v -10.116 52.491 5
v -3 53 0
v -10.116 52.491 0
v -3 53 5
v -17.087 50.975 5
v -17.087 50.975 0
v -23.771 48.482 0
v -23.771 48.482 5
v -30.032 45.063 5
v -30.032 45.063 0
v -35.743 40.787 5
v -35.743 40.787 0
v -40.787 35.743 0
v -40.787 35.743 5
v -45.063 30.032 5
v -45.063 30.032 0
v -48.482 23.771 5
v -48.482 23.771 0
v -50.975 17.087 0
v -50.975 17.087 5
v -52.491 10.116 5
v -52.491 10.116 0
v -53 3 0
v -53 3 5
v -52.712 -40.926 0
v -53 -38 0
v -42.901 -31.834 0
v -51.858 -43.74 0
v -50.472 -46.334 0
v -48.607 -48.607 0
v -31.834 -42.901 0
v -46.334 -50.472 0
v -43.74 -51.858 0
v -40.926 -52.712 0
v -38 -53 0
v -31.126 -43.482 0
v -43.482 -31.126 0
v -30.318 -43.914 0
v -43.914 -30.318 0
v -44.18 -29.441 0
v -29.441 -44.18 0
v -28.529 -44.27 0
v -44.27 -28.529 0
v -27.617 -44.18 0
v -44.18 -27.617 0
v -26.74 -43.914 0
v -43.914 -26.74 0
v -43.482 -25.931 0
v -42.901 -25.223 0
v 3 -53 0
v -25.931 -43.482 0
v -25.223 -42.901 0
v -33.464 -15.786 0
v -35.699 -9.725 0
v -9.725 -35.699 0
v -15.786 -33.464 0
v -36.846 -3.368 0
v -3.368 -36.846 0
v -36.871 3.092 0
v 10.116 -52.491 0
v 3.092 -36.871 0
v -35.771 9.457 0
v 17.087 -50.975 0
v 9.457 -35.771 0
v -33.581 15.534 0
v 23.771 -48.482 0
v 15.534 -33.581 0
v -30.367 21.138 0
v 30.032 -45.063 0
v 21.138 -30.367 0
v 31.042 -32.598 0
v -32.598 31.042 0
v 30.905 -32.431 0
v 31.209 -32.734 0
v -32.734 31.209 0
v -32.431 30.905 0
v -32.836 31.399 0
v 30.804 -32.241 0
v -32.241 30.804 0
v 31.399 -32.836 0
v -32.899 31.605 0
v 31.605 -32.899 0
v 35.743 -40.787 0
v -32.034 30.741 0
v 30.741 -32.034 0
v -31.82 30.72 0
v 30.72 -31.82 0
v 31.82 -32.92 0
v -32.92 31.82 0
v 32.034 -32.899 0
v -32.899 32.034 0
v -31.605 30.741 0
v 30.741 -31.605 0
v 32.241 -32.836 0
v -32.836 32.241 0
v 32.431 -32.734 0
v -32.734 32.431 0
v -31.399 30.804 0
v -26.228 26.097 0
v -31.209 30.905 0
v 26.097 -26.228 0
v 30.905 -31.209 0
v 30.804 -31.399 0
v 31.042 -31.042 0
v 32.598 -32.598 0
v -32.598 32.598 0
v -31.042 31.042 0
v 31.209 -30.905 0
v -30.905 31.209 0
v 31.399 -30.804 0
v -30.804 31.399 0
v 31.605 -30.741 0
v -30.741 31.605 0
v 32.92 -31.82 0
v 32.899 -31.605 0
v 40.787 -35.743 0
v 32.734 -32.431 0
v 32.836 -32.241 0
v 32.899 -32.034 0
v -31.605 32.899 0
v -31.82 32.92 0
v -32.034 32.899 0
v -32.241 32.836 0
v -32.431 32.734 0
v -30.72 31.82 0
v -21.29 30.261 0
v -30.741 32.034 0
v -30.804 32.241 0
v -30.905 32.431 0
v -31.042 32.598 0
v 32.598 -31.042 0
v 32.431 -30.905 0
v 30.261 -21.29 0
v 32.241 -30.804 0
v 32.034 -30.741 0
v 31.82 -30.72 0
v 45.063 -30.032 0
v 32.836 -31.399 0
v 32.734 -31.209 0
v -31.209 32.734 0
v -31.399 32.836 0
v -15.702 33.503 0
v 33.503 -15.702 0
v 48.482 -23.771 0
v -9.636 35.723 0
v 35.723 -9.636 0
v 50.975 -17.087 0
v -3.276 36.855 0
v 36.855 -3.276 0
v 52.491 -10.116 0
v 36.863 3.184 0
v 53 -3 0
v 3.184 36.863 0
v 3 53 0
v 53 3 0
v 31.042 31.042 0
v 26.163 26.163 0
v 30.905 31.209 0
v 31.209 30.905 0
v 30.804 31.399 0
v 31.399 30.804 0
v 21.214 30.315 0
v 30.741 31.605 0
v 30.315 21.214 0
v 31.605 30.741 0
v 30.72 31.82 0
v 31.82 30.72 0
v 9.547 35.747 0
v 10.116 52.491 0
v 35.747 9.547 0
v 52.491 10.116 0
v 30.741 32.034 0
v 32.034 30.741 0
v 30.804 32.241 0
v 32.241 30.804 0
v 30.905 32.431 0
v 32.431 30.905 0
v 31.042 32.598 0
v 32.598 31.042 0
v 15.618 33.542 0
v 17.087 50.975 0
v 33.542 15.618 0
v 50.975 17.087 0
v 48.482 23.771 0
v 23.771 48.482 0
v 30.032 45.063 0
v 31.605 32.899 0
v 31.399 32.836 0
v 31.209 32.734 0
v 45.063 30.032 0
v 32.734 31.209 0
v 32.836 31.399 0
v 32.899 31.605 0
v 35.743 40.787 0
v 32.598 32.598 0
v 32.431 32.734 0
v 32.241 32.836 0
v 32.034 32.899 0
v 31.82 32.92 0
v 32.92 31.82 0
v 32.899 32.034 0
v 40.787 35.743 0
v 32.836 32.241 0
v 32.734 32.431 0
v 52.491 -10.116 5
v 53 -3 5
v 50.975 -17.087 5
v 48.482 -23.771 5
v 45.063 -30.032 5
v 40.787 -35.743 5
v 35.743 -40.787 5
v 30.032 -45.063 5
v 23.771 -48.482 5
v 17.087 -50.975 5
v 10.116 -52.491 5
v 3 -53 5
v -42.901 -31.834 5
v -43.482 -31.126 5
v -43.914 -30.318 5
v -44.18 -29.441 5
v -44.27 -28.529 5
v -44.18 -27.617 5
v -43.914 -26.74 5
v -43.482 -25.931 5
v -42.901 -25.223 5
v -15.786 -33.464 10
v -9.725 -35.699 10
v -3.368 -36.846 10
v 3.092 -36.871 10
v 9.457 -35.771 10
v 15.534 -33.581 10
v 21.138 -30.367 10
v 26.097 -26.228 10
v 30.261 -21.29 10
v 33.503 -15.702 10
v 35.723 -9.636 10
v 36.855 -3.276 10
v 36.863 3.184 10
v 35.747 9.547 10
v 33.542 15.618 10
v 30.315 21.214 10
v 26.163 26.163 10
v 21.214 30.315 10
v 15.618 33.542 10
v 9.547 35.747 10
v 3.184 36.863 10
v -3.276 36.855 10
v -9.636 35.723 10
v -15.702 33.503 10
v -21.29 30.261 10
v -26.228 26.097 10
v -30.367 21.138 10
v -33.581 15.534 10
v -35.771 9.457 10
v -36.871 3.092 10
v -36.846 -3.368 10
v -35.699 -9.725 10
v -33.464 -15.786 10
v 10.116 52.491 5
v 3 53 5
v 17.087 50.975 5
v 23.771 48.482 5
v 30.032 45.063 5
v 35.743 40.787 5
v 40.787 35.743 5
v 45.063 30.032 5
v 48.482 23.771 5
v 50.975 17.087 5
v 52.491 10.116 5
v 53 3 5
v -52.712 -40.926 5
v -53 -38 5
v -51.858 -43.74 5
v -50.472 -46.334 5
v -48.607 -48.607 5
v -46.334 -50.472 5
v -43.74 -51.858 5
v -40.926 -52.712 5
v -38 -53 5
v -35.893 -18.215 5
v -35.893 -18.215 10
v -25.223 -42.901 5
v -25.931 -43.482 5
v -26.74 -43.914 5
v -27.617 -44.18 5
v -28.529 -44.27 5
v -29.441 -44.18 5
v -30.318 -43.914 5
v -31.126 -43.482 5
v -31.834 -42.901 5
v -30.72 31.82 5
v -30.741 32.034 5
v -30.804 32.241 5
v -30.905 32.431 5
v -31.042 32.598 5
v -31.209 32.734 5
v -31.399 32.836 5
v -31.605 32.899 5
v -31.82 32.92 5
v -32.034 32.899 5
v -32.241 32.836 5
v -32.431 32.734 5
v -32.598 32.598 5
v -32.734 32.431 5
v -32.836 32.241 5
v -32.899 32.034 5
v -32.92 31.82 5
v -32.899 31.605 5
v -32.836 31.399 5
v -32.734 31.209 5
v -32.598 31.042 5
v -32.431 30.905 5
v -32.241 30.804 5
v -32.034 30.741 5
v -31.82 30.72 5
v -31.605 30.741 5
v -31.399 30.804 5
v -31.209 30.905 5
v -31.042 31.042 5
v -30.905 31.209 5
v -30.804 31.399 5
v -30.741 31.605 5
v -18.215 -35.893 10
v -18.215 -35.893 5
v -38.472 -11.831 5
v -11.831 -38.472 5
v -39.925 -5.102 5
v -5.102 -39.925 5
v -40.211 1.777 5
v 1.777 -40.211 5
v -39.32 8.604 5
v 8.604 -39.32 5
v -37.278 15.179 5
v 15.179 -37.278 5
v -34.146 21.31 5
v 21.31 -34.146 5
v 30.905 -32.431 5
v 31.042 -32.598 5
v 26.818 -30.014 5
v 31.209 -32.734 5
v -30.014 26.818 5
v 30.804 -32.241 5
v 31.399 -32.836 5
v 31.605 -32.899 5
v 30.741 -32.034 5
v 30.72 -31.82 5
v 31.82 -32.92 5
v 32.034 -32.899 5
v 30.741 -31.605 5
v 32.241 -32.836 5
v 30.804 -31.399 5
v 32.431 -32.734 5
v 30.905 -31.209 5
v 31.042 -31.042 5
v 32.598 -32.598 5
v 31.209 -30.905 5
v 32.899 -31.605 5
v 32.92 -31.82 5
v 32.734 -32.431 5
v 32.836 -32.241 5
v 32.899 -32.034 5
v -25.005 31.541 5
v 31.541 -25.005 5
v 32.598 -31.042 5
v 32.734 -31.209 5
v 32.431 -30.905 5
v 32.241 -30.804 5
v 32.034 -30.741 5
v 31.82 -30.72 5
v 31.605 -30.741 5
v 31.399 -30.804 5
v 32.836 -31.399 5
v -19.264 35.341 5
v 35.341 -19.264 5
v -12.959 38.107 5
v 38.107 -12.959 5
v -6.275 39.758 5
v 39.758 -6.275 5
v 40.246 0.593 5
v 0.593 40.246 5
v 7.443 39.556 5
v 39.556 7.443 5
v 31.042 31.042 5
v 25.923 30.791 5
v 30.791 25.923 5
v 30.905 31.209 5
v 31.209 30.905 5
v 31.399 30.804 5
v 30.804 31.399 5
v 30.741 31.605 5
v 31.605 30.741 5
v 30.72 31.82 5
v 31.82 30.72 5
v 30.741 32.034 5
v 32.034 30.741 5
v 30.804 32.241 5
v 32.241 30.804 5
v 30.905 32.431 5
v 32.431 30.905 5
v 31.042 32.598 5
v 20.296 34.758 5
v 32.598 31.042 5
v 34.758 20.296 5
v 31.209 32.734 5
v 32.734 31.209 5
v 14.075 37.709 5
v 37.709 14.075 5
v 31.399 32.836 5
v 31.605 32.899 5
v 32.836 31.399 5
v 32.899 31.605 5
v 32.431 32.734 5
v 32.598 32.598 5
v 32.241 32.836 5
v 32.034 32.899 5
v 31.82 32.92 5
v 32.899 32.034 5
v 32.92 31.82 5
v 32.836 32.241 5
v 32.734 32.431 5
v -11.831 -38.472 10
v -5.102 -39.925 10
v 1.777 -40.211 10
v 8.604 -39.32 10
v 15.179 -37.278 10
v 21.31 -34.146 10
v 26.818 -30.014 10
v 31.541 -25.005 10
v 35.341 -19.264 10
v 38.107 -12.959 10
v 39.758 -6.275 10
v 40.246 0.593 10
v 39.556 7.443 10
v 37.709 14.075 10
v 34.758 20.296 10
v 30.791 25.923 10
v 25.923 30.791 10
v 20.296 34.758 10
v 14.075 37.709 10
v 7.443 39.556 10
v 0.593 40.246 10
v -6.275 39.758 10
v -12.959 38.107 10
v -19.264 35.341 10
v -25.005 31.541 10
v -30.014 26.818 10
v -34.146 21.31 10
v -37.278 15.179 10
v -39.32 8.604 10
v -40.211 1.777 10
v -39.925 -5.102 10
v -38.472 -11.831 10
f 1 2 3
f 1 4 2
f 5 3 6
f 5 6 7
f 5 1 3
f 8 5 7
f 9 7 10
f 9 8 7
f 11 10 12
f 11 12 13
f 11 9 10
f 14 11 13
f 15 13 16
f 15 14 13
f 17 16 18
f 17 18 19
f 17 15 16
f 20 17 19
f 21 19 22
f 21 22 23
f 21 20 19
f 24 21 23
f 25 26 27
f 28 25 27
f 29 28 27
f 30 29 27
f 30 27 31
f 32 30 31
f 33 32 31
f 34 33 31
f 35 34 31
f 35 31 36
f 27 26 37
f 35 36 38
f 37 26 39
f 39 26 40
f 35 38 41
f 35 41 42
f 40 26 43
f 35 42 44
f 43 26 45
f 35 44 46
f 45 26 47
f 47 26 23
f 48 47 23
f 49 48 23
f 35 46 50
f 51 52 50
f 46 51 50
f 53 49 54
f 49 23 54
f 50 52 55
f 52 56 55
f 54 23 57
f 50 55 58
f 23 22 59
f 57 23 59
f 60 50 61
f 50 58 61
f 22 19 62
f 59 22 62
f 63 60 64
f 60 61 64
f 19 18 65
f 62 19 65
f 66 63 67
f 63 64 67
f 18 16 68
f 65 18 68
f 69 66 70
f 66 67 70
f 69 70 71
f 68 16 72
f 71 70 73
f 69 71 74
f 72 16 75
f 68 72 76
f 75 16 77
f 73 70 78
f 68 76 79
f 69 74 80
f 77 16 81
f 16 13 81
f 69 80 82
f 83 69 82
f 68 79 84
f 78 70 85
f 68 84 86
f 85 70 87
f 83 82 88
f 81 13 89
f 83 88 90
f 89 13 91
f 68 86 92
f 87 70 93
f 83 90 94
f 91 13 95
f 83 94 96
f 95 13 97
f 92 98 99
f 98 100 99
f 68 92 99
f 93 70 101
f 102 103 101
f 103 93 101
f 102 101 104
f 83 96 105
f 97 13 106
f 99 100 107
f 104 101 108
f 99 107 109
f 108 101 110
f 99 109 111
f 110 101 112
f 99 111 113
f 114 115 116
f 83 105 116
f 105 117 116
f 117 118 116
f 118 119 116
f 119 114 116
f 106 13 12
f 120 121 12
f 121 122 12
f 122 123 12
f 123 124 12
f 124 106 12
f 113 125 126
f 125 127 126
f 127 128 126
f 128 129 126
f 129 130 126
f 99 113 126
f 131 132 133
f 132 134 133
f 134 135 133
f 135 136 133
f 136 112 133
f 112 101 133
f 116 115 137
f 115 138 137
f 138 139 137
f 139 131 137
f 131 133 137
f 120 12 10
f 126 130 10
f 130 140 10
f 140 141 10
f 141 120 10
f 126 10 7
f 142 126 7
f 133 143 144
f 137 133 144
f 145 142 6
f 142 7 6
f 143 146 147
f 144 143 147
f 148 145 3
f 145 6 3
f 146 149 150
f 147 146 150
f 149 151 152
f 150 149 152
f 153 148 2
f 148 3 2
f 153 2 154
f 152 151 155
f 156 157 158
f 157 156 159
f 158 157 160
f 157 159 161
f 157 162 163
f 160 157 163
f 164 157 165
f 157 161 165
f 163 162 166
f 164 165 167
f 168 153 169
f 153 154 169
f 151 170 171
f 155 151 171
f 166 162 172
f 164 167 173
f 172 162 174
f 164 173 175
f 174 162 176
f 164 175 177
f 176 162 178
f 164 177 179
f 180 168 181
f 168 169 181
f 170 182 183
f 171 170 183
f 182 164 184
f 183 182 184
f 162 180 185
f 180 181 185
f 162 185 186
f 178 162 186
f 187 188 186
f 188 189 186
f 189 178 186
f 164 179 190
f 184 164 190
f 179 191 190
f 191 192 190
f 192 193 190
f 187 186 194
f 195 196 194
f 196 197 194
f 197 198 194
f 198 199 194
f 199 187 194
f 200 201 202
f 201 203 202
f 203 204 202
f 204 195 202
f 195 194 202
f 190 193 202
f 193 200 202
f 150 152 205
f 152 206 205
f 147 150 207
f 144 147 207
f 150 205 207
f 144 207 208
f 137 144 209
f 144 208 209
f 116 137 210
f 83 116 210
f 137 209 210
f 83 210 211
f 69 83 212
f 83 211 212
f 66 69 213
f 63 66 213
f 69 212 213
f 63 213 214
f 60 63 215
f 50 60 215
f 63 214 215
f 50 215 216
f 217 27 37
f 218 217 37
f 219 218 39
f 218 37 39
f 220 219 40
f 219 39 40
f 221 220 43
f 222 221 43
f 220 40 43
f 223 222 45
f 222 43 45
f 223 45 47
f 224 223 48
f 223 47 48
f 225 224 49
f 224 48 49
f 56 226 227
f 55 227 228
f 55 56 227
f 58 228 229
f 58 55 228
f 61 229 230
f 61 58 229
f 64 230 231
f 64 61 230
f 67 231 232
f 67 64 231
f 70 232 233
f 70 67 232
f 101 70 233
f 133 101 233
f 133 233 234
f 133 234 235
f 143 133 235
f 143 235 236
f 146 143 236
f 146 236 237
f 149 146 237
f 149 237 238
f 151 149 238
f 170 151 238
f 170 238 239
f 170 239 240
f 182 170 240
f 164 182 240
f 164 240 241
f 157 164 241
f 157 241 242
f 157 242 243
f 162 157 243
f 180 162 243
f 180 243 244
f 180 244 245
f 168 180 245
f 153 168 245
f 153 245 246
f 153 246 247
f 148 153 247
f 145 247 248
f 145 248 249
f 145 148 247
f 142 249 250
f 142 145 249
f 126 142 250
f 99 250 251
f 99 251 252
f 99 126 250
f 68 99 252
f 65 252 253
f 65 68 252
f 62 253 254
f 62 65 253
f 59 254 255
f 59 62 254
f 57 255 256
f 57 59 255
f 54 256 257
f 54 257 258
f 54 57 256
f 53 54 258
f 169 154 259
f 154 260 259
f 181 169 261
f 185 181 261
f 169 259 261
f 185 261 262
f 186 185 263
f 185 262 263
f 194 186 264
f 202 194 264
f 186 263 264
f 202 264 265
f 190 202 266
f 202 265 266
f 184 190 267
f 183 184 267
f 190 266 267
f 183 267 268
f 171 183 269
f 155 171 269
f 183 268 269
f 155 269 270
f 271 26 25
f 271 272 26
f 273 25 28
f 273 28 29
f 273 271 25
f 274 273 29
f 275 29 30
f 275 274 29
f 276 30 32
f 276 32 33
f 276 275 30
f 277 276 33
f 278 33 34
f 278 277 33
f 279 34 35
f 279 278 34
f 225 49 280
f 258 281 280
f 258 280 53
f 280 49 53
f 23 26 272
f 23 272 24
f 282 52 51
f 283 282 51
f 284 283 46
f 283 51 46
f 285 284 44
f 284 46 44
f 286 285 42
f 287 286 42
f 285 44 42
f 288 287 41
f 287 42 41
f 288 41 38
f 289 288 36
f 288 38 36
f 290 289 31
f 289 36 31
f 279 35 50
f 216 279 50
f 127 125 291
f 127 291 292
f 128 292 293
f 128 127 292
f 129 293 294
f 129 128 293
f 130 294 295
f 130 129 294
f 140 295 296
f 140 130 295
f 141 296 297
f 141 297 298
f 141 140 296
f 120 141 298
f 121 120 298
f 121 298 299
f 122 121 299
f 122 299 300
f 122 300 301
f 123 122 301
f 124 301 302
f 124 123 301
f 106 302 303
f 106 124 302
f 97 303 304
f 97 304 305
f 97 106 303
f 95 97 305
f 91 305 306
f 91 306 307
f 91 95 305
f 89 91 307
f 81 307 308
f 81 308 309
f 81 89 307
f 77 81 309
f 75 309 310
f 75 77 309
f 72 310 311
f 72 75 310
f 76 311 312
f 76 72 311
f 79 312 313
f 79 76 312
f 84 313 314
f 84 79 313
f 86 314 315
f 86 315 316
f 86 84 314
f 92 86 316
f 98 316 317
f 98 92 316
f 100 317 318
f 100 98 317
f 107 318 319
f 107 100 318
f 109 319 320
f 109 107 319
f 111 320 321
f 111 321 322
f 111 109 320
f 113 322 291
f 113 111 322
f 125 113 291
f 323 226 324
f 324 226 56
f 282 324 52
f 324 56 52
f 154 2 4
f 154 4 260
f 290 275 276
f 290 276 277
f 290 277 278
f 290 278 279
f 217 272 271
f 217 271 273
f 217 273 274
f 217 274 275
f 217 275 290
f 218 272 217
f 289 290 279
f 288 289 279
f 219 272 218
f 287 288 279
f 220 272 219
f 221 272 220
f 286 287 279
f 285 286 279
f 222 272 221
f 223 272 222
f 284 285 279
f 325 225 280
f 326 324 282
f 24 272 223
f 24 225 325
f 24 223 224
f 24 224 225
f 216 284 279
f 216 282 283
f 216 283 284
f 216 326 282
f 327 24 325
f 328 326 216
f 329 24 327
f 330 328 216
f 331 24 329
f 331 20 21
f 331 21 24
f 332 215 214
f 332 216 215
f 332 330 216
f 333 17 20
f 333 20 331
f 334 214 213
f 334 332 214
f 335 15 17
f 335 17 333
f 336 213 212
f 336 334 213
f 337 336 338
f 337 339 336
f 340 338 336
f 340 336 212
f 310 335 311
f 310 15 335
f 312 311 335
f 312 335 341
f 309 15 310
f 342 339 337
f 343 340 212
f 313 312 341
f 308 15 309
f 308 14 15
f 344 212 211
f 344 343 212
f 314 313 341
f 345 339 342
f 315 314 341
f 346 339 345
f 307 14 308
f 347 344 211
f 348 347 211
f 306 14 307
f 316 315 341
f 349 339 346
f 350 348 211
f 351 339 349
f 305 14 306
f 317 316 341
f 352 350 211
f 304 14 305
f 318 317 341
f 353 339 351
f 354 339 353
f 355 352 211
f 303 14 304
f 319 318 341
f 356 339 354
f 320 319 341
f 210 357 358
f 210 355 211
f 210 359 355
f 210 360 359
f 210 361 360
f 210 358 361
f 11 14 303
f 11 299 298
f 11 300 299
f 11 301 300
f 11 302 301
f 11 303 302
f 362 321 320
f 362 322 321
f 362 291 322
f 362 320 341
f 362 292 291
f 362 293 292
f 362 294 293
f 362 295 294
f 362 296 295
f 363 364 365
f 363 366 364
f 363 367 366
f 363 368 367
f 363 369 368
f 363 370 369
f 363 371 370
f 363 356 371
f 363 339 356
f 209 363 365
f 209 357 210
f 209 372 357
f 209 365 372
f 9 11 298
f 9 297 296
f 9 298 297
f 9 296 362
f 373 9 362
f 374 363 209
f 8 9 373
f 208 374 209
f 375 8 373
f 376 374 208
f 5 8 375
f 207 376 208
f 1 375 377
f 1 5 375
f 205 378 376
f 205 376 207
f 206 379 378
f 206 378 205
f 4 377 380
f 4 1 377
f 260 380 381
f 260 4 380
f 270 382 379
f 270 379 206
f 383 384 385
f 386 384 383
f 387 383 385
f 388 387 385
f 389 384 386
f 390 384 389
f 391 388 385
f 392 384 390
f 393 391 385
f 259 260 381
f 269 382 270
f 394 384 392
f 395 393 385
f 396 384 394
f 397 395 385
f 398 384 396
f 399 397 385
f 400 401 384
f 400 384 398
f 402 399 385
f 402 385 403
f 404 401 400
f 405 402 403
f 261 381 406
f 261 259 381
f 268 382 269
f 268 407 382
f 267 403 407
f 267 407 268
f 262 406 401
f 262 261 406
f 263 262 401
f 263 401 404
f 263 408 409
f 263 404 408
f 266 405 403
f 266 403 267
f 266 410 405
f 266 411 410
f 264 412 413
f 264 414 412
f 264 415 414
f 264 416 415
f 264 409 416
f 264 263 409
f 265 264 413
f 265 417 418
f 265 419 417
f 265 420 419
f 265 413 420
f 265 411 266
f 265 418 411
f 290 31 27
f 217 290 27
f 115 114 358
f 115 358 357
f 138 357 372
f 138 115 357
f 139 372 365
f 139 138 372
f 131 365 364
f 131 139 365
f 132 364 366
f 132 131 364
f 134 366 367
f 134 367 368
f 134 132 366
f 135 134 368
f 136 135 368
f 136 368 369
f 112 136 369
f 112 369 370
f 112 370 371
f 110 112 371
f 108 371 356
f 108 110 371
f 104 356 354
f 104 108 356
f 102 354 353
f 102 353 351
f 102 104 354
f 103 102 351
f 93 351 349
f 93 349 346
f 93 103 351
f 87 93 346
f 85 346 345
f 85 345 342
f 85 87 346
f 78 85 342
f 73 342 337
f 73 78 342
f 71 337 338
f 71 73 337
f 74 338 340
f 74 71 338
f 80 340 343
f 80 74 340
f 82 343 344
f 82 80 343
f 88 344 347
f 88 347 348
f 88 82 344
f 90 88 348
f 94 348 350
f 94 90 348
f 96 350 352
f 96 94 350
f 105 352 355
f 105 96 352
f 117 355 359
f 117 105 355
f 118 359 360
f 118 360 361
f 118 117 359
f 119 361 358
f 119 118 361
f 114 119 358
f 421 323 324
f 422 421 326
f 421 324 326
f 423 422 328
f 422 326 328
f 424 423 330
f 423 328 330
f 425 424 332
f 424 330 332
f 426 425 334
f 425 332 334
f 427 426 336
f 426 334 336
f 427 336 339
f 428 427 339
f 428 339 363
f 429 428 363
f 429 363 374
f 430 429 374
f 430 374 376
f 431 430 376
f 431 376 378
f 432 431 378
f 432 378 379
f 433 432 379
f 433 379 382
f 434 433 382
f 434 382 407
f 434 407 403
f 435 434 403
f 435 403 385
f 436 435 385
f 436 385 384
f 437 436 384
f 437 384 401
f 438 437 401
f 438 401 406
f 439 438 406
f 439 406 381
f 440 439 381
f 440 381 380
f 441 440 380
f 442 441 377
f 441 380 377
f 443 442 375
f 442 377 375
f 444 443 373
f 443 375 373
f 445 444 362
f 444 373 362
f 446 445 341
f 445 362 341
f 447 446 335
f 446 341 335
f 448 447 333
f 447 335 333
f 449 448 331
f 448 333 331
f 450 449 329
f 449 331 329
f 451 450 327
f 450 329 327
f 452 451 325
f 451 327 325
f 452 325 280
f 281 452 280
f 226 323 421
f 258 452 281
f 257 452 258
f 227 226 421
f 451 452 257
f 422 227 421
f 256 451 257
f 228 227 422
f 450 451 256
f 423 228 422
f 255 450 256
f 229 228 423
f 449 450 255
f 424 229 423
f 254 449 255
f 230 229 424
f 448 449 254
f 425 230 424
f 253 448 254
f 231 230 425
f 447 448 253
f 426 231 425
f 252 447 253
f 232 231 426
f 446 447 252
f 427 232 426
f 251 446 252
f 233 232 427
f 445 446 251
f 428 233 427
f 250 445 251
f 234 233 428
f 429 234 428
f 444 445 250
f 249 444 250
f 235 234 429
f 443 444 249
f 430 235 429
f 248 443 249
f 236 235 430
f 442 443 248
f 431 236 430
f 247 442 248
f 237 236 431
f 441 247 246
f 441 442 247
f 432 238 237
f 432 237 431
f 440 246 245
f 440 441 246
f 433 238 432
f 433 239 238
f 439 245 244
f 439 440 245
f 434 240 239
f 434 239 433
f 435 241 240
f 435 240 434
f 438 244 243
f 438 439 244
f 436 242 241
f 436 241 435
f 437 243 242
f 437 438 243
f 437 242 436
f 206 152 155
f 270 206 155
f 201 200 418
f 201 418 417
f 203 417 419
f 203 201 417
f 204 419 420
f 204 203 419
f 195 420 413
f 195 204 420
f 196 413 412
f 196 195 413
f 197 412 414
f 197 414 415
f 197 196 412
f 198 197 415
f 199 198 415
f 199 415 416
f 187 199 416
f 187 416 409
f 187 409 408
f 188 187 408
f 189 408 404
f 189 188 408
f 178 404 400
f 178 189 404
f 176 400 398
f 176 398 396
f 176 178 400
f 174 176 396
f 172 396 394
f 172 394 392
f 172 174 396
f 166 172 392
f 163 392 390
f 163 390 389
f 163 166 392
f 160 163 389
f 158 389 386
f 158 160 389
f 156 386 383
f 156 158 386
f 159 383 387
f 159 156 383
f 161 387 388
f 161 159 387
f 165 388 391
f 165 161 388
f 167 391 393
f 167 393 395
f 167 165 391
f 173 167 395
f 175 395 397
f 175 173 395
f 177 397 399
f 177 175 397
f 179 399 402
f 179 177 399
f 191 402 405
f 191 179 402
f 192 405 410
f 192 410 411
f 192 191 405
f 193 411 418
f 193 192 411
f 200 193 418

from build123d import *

# Parameters (mm, degrees)
PAD004_DEPTH  = 10
SKETCH001_R   = 40.25
SKETCH001_R_2 = 37
PAD005_DEPTH  = 10
SKETCH_W      = 106
SKETCH_H      = 106
SKETCH_R      = 1.1
SKETCH_R_2    = 37
PAD_DEPTH     = 5
FILLET_1_R    = 50
FILLET_2_R    = 15


with BuildPart() as pad_encoder_hole:
    # Sketch006 → Pad004 (new body)
    with BuildSketch(Plane.XY):
        with BuildLine():
            ThreePointArc((-42.900661, -31.83444), (-44.269937, -28.528716), (-42.900661, -25.222992))
            Line((-42.900661, -25.222992), (-31.955387, -14.277718))
            ThreePointArc((-31.955387, -14.277718), (-24.748737, -24.748737), (-14.277718, -31.955387))
            Line((-14.277718, -31.955387), (-25.222992, -42.900661))
            ThreePointArc((-25.222992, -42.900661), (-28.528716, -44.269937), (-31.83444, -42.900661))
            Line((-31.83444, -42.900661), (-42.900661, -31.83444))
        make_face()
    extrude(amount=PAD004_DEPTH)


with BuildPart() as pad_ring:
    # Sketch001 → Pad005 (new body)
    with BuildSketch(Plane.XY):
        Circle(SKETCH001_R)
        Circle(SKETCH001_R_2, mode=Mode.SUBTRACT)
    extrude(amount=PAD005_DEPTH)


with BuildPart() as fillet_remove_material:
    # Sketch → Pad (new body)
    with BuildSketch(Plane.XY):
        Rectangle(SKETCH_W, SKETCH_H)
        with Locations((-31.819805, 31.819805)):
            Circle(SKETCH_R, mode=Mode.SUBTRACT)
        with Locations((31.819805, 31.819805)):
            Circle(SKETCH_R, mode=Mode.SUBTRACT)
        with Locations((31.819805, -31.819805)):
            Circle(SKETCH_R, mode=Mode.SUBTRACT)
        with Locations((-31.819805, -31.819805)):
            Circle(SKETCH_R, mode=Mode.SUBTRACT)
        Circle(SKETCH_R_2, mode=Mode.SUBTRACT)
    extrude(amount=PAD_DEPTH)

    # Fusion: union Pad (ring)
    add(pad_ring.part)

    # Cut: cut Pad (encoder hole)
    add(pad_encoder_hole.part, mode=Mode.SUBTRACT)

    # Fillet 1
    fillet_1_edges = [fillet_remove_material.edges().sort_by_distance(p)[0] for p in [
        (-53, 53, 2.5),
        (53, 53, 2.5),
        (53, -53, 2.5),
    ]]
    fillet(fillet_1_edges, radius=FILLET_1_R)

    # Fillet 2
    fillet_2_edges = [fillet_remove_material.edges().sort_by_distance(p)[0] for p in [
        (-53, -53, 2.5),
    ]]
    fillet(fillet_2_edges, radius=FILLET_2_R)


solid = fillet_remove_material.part
